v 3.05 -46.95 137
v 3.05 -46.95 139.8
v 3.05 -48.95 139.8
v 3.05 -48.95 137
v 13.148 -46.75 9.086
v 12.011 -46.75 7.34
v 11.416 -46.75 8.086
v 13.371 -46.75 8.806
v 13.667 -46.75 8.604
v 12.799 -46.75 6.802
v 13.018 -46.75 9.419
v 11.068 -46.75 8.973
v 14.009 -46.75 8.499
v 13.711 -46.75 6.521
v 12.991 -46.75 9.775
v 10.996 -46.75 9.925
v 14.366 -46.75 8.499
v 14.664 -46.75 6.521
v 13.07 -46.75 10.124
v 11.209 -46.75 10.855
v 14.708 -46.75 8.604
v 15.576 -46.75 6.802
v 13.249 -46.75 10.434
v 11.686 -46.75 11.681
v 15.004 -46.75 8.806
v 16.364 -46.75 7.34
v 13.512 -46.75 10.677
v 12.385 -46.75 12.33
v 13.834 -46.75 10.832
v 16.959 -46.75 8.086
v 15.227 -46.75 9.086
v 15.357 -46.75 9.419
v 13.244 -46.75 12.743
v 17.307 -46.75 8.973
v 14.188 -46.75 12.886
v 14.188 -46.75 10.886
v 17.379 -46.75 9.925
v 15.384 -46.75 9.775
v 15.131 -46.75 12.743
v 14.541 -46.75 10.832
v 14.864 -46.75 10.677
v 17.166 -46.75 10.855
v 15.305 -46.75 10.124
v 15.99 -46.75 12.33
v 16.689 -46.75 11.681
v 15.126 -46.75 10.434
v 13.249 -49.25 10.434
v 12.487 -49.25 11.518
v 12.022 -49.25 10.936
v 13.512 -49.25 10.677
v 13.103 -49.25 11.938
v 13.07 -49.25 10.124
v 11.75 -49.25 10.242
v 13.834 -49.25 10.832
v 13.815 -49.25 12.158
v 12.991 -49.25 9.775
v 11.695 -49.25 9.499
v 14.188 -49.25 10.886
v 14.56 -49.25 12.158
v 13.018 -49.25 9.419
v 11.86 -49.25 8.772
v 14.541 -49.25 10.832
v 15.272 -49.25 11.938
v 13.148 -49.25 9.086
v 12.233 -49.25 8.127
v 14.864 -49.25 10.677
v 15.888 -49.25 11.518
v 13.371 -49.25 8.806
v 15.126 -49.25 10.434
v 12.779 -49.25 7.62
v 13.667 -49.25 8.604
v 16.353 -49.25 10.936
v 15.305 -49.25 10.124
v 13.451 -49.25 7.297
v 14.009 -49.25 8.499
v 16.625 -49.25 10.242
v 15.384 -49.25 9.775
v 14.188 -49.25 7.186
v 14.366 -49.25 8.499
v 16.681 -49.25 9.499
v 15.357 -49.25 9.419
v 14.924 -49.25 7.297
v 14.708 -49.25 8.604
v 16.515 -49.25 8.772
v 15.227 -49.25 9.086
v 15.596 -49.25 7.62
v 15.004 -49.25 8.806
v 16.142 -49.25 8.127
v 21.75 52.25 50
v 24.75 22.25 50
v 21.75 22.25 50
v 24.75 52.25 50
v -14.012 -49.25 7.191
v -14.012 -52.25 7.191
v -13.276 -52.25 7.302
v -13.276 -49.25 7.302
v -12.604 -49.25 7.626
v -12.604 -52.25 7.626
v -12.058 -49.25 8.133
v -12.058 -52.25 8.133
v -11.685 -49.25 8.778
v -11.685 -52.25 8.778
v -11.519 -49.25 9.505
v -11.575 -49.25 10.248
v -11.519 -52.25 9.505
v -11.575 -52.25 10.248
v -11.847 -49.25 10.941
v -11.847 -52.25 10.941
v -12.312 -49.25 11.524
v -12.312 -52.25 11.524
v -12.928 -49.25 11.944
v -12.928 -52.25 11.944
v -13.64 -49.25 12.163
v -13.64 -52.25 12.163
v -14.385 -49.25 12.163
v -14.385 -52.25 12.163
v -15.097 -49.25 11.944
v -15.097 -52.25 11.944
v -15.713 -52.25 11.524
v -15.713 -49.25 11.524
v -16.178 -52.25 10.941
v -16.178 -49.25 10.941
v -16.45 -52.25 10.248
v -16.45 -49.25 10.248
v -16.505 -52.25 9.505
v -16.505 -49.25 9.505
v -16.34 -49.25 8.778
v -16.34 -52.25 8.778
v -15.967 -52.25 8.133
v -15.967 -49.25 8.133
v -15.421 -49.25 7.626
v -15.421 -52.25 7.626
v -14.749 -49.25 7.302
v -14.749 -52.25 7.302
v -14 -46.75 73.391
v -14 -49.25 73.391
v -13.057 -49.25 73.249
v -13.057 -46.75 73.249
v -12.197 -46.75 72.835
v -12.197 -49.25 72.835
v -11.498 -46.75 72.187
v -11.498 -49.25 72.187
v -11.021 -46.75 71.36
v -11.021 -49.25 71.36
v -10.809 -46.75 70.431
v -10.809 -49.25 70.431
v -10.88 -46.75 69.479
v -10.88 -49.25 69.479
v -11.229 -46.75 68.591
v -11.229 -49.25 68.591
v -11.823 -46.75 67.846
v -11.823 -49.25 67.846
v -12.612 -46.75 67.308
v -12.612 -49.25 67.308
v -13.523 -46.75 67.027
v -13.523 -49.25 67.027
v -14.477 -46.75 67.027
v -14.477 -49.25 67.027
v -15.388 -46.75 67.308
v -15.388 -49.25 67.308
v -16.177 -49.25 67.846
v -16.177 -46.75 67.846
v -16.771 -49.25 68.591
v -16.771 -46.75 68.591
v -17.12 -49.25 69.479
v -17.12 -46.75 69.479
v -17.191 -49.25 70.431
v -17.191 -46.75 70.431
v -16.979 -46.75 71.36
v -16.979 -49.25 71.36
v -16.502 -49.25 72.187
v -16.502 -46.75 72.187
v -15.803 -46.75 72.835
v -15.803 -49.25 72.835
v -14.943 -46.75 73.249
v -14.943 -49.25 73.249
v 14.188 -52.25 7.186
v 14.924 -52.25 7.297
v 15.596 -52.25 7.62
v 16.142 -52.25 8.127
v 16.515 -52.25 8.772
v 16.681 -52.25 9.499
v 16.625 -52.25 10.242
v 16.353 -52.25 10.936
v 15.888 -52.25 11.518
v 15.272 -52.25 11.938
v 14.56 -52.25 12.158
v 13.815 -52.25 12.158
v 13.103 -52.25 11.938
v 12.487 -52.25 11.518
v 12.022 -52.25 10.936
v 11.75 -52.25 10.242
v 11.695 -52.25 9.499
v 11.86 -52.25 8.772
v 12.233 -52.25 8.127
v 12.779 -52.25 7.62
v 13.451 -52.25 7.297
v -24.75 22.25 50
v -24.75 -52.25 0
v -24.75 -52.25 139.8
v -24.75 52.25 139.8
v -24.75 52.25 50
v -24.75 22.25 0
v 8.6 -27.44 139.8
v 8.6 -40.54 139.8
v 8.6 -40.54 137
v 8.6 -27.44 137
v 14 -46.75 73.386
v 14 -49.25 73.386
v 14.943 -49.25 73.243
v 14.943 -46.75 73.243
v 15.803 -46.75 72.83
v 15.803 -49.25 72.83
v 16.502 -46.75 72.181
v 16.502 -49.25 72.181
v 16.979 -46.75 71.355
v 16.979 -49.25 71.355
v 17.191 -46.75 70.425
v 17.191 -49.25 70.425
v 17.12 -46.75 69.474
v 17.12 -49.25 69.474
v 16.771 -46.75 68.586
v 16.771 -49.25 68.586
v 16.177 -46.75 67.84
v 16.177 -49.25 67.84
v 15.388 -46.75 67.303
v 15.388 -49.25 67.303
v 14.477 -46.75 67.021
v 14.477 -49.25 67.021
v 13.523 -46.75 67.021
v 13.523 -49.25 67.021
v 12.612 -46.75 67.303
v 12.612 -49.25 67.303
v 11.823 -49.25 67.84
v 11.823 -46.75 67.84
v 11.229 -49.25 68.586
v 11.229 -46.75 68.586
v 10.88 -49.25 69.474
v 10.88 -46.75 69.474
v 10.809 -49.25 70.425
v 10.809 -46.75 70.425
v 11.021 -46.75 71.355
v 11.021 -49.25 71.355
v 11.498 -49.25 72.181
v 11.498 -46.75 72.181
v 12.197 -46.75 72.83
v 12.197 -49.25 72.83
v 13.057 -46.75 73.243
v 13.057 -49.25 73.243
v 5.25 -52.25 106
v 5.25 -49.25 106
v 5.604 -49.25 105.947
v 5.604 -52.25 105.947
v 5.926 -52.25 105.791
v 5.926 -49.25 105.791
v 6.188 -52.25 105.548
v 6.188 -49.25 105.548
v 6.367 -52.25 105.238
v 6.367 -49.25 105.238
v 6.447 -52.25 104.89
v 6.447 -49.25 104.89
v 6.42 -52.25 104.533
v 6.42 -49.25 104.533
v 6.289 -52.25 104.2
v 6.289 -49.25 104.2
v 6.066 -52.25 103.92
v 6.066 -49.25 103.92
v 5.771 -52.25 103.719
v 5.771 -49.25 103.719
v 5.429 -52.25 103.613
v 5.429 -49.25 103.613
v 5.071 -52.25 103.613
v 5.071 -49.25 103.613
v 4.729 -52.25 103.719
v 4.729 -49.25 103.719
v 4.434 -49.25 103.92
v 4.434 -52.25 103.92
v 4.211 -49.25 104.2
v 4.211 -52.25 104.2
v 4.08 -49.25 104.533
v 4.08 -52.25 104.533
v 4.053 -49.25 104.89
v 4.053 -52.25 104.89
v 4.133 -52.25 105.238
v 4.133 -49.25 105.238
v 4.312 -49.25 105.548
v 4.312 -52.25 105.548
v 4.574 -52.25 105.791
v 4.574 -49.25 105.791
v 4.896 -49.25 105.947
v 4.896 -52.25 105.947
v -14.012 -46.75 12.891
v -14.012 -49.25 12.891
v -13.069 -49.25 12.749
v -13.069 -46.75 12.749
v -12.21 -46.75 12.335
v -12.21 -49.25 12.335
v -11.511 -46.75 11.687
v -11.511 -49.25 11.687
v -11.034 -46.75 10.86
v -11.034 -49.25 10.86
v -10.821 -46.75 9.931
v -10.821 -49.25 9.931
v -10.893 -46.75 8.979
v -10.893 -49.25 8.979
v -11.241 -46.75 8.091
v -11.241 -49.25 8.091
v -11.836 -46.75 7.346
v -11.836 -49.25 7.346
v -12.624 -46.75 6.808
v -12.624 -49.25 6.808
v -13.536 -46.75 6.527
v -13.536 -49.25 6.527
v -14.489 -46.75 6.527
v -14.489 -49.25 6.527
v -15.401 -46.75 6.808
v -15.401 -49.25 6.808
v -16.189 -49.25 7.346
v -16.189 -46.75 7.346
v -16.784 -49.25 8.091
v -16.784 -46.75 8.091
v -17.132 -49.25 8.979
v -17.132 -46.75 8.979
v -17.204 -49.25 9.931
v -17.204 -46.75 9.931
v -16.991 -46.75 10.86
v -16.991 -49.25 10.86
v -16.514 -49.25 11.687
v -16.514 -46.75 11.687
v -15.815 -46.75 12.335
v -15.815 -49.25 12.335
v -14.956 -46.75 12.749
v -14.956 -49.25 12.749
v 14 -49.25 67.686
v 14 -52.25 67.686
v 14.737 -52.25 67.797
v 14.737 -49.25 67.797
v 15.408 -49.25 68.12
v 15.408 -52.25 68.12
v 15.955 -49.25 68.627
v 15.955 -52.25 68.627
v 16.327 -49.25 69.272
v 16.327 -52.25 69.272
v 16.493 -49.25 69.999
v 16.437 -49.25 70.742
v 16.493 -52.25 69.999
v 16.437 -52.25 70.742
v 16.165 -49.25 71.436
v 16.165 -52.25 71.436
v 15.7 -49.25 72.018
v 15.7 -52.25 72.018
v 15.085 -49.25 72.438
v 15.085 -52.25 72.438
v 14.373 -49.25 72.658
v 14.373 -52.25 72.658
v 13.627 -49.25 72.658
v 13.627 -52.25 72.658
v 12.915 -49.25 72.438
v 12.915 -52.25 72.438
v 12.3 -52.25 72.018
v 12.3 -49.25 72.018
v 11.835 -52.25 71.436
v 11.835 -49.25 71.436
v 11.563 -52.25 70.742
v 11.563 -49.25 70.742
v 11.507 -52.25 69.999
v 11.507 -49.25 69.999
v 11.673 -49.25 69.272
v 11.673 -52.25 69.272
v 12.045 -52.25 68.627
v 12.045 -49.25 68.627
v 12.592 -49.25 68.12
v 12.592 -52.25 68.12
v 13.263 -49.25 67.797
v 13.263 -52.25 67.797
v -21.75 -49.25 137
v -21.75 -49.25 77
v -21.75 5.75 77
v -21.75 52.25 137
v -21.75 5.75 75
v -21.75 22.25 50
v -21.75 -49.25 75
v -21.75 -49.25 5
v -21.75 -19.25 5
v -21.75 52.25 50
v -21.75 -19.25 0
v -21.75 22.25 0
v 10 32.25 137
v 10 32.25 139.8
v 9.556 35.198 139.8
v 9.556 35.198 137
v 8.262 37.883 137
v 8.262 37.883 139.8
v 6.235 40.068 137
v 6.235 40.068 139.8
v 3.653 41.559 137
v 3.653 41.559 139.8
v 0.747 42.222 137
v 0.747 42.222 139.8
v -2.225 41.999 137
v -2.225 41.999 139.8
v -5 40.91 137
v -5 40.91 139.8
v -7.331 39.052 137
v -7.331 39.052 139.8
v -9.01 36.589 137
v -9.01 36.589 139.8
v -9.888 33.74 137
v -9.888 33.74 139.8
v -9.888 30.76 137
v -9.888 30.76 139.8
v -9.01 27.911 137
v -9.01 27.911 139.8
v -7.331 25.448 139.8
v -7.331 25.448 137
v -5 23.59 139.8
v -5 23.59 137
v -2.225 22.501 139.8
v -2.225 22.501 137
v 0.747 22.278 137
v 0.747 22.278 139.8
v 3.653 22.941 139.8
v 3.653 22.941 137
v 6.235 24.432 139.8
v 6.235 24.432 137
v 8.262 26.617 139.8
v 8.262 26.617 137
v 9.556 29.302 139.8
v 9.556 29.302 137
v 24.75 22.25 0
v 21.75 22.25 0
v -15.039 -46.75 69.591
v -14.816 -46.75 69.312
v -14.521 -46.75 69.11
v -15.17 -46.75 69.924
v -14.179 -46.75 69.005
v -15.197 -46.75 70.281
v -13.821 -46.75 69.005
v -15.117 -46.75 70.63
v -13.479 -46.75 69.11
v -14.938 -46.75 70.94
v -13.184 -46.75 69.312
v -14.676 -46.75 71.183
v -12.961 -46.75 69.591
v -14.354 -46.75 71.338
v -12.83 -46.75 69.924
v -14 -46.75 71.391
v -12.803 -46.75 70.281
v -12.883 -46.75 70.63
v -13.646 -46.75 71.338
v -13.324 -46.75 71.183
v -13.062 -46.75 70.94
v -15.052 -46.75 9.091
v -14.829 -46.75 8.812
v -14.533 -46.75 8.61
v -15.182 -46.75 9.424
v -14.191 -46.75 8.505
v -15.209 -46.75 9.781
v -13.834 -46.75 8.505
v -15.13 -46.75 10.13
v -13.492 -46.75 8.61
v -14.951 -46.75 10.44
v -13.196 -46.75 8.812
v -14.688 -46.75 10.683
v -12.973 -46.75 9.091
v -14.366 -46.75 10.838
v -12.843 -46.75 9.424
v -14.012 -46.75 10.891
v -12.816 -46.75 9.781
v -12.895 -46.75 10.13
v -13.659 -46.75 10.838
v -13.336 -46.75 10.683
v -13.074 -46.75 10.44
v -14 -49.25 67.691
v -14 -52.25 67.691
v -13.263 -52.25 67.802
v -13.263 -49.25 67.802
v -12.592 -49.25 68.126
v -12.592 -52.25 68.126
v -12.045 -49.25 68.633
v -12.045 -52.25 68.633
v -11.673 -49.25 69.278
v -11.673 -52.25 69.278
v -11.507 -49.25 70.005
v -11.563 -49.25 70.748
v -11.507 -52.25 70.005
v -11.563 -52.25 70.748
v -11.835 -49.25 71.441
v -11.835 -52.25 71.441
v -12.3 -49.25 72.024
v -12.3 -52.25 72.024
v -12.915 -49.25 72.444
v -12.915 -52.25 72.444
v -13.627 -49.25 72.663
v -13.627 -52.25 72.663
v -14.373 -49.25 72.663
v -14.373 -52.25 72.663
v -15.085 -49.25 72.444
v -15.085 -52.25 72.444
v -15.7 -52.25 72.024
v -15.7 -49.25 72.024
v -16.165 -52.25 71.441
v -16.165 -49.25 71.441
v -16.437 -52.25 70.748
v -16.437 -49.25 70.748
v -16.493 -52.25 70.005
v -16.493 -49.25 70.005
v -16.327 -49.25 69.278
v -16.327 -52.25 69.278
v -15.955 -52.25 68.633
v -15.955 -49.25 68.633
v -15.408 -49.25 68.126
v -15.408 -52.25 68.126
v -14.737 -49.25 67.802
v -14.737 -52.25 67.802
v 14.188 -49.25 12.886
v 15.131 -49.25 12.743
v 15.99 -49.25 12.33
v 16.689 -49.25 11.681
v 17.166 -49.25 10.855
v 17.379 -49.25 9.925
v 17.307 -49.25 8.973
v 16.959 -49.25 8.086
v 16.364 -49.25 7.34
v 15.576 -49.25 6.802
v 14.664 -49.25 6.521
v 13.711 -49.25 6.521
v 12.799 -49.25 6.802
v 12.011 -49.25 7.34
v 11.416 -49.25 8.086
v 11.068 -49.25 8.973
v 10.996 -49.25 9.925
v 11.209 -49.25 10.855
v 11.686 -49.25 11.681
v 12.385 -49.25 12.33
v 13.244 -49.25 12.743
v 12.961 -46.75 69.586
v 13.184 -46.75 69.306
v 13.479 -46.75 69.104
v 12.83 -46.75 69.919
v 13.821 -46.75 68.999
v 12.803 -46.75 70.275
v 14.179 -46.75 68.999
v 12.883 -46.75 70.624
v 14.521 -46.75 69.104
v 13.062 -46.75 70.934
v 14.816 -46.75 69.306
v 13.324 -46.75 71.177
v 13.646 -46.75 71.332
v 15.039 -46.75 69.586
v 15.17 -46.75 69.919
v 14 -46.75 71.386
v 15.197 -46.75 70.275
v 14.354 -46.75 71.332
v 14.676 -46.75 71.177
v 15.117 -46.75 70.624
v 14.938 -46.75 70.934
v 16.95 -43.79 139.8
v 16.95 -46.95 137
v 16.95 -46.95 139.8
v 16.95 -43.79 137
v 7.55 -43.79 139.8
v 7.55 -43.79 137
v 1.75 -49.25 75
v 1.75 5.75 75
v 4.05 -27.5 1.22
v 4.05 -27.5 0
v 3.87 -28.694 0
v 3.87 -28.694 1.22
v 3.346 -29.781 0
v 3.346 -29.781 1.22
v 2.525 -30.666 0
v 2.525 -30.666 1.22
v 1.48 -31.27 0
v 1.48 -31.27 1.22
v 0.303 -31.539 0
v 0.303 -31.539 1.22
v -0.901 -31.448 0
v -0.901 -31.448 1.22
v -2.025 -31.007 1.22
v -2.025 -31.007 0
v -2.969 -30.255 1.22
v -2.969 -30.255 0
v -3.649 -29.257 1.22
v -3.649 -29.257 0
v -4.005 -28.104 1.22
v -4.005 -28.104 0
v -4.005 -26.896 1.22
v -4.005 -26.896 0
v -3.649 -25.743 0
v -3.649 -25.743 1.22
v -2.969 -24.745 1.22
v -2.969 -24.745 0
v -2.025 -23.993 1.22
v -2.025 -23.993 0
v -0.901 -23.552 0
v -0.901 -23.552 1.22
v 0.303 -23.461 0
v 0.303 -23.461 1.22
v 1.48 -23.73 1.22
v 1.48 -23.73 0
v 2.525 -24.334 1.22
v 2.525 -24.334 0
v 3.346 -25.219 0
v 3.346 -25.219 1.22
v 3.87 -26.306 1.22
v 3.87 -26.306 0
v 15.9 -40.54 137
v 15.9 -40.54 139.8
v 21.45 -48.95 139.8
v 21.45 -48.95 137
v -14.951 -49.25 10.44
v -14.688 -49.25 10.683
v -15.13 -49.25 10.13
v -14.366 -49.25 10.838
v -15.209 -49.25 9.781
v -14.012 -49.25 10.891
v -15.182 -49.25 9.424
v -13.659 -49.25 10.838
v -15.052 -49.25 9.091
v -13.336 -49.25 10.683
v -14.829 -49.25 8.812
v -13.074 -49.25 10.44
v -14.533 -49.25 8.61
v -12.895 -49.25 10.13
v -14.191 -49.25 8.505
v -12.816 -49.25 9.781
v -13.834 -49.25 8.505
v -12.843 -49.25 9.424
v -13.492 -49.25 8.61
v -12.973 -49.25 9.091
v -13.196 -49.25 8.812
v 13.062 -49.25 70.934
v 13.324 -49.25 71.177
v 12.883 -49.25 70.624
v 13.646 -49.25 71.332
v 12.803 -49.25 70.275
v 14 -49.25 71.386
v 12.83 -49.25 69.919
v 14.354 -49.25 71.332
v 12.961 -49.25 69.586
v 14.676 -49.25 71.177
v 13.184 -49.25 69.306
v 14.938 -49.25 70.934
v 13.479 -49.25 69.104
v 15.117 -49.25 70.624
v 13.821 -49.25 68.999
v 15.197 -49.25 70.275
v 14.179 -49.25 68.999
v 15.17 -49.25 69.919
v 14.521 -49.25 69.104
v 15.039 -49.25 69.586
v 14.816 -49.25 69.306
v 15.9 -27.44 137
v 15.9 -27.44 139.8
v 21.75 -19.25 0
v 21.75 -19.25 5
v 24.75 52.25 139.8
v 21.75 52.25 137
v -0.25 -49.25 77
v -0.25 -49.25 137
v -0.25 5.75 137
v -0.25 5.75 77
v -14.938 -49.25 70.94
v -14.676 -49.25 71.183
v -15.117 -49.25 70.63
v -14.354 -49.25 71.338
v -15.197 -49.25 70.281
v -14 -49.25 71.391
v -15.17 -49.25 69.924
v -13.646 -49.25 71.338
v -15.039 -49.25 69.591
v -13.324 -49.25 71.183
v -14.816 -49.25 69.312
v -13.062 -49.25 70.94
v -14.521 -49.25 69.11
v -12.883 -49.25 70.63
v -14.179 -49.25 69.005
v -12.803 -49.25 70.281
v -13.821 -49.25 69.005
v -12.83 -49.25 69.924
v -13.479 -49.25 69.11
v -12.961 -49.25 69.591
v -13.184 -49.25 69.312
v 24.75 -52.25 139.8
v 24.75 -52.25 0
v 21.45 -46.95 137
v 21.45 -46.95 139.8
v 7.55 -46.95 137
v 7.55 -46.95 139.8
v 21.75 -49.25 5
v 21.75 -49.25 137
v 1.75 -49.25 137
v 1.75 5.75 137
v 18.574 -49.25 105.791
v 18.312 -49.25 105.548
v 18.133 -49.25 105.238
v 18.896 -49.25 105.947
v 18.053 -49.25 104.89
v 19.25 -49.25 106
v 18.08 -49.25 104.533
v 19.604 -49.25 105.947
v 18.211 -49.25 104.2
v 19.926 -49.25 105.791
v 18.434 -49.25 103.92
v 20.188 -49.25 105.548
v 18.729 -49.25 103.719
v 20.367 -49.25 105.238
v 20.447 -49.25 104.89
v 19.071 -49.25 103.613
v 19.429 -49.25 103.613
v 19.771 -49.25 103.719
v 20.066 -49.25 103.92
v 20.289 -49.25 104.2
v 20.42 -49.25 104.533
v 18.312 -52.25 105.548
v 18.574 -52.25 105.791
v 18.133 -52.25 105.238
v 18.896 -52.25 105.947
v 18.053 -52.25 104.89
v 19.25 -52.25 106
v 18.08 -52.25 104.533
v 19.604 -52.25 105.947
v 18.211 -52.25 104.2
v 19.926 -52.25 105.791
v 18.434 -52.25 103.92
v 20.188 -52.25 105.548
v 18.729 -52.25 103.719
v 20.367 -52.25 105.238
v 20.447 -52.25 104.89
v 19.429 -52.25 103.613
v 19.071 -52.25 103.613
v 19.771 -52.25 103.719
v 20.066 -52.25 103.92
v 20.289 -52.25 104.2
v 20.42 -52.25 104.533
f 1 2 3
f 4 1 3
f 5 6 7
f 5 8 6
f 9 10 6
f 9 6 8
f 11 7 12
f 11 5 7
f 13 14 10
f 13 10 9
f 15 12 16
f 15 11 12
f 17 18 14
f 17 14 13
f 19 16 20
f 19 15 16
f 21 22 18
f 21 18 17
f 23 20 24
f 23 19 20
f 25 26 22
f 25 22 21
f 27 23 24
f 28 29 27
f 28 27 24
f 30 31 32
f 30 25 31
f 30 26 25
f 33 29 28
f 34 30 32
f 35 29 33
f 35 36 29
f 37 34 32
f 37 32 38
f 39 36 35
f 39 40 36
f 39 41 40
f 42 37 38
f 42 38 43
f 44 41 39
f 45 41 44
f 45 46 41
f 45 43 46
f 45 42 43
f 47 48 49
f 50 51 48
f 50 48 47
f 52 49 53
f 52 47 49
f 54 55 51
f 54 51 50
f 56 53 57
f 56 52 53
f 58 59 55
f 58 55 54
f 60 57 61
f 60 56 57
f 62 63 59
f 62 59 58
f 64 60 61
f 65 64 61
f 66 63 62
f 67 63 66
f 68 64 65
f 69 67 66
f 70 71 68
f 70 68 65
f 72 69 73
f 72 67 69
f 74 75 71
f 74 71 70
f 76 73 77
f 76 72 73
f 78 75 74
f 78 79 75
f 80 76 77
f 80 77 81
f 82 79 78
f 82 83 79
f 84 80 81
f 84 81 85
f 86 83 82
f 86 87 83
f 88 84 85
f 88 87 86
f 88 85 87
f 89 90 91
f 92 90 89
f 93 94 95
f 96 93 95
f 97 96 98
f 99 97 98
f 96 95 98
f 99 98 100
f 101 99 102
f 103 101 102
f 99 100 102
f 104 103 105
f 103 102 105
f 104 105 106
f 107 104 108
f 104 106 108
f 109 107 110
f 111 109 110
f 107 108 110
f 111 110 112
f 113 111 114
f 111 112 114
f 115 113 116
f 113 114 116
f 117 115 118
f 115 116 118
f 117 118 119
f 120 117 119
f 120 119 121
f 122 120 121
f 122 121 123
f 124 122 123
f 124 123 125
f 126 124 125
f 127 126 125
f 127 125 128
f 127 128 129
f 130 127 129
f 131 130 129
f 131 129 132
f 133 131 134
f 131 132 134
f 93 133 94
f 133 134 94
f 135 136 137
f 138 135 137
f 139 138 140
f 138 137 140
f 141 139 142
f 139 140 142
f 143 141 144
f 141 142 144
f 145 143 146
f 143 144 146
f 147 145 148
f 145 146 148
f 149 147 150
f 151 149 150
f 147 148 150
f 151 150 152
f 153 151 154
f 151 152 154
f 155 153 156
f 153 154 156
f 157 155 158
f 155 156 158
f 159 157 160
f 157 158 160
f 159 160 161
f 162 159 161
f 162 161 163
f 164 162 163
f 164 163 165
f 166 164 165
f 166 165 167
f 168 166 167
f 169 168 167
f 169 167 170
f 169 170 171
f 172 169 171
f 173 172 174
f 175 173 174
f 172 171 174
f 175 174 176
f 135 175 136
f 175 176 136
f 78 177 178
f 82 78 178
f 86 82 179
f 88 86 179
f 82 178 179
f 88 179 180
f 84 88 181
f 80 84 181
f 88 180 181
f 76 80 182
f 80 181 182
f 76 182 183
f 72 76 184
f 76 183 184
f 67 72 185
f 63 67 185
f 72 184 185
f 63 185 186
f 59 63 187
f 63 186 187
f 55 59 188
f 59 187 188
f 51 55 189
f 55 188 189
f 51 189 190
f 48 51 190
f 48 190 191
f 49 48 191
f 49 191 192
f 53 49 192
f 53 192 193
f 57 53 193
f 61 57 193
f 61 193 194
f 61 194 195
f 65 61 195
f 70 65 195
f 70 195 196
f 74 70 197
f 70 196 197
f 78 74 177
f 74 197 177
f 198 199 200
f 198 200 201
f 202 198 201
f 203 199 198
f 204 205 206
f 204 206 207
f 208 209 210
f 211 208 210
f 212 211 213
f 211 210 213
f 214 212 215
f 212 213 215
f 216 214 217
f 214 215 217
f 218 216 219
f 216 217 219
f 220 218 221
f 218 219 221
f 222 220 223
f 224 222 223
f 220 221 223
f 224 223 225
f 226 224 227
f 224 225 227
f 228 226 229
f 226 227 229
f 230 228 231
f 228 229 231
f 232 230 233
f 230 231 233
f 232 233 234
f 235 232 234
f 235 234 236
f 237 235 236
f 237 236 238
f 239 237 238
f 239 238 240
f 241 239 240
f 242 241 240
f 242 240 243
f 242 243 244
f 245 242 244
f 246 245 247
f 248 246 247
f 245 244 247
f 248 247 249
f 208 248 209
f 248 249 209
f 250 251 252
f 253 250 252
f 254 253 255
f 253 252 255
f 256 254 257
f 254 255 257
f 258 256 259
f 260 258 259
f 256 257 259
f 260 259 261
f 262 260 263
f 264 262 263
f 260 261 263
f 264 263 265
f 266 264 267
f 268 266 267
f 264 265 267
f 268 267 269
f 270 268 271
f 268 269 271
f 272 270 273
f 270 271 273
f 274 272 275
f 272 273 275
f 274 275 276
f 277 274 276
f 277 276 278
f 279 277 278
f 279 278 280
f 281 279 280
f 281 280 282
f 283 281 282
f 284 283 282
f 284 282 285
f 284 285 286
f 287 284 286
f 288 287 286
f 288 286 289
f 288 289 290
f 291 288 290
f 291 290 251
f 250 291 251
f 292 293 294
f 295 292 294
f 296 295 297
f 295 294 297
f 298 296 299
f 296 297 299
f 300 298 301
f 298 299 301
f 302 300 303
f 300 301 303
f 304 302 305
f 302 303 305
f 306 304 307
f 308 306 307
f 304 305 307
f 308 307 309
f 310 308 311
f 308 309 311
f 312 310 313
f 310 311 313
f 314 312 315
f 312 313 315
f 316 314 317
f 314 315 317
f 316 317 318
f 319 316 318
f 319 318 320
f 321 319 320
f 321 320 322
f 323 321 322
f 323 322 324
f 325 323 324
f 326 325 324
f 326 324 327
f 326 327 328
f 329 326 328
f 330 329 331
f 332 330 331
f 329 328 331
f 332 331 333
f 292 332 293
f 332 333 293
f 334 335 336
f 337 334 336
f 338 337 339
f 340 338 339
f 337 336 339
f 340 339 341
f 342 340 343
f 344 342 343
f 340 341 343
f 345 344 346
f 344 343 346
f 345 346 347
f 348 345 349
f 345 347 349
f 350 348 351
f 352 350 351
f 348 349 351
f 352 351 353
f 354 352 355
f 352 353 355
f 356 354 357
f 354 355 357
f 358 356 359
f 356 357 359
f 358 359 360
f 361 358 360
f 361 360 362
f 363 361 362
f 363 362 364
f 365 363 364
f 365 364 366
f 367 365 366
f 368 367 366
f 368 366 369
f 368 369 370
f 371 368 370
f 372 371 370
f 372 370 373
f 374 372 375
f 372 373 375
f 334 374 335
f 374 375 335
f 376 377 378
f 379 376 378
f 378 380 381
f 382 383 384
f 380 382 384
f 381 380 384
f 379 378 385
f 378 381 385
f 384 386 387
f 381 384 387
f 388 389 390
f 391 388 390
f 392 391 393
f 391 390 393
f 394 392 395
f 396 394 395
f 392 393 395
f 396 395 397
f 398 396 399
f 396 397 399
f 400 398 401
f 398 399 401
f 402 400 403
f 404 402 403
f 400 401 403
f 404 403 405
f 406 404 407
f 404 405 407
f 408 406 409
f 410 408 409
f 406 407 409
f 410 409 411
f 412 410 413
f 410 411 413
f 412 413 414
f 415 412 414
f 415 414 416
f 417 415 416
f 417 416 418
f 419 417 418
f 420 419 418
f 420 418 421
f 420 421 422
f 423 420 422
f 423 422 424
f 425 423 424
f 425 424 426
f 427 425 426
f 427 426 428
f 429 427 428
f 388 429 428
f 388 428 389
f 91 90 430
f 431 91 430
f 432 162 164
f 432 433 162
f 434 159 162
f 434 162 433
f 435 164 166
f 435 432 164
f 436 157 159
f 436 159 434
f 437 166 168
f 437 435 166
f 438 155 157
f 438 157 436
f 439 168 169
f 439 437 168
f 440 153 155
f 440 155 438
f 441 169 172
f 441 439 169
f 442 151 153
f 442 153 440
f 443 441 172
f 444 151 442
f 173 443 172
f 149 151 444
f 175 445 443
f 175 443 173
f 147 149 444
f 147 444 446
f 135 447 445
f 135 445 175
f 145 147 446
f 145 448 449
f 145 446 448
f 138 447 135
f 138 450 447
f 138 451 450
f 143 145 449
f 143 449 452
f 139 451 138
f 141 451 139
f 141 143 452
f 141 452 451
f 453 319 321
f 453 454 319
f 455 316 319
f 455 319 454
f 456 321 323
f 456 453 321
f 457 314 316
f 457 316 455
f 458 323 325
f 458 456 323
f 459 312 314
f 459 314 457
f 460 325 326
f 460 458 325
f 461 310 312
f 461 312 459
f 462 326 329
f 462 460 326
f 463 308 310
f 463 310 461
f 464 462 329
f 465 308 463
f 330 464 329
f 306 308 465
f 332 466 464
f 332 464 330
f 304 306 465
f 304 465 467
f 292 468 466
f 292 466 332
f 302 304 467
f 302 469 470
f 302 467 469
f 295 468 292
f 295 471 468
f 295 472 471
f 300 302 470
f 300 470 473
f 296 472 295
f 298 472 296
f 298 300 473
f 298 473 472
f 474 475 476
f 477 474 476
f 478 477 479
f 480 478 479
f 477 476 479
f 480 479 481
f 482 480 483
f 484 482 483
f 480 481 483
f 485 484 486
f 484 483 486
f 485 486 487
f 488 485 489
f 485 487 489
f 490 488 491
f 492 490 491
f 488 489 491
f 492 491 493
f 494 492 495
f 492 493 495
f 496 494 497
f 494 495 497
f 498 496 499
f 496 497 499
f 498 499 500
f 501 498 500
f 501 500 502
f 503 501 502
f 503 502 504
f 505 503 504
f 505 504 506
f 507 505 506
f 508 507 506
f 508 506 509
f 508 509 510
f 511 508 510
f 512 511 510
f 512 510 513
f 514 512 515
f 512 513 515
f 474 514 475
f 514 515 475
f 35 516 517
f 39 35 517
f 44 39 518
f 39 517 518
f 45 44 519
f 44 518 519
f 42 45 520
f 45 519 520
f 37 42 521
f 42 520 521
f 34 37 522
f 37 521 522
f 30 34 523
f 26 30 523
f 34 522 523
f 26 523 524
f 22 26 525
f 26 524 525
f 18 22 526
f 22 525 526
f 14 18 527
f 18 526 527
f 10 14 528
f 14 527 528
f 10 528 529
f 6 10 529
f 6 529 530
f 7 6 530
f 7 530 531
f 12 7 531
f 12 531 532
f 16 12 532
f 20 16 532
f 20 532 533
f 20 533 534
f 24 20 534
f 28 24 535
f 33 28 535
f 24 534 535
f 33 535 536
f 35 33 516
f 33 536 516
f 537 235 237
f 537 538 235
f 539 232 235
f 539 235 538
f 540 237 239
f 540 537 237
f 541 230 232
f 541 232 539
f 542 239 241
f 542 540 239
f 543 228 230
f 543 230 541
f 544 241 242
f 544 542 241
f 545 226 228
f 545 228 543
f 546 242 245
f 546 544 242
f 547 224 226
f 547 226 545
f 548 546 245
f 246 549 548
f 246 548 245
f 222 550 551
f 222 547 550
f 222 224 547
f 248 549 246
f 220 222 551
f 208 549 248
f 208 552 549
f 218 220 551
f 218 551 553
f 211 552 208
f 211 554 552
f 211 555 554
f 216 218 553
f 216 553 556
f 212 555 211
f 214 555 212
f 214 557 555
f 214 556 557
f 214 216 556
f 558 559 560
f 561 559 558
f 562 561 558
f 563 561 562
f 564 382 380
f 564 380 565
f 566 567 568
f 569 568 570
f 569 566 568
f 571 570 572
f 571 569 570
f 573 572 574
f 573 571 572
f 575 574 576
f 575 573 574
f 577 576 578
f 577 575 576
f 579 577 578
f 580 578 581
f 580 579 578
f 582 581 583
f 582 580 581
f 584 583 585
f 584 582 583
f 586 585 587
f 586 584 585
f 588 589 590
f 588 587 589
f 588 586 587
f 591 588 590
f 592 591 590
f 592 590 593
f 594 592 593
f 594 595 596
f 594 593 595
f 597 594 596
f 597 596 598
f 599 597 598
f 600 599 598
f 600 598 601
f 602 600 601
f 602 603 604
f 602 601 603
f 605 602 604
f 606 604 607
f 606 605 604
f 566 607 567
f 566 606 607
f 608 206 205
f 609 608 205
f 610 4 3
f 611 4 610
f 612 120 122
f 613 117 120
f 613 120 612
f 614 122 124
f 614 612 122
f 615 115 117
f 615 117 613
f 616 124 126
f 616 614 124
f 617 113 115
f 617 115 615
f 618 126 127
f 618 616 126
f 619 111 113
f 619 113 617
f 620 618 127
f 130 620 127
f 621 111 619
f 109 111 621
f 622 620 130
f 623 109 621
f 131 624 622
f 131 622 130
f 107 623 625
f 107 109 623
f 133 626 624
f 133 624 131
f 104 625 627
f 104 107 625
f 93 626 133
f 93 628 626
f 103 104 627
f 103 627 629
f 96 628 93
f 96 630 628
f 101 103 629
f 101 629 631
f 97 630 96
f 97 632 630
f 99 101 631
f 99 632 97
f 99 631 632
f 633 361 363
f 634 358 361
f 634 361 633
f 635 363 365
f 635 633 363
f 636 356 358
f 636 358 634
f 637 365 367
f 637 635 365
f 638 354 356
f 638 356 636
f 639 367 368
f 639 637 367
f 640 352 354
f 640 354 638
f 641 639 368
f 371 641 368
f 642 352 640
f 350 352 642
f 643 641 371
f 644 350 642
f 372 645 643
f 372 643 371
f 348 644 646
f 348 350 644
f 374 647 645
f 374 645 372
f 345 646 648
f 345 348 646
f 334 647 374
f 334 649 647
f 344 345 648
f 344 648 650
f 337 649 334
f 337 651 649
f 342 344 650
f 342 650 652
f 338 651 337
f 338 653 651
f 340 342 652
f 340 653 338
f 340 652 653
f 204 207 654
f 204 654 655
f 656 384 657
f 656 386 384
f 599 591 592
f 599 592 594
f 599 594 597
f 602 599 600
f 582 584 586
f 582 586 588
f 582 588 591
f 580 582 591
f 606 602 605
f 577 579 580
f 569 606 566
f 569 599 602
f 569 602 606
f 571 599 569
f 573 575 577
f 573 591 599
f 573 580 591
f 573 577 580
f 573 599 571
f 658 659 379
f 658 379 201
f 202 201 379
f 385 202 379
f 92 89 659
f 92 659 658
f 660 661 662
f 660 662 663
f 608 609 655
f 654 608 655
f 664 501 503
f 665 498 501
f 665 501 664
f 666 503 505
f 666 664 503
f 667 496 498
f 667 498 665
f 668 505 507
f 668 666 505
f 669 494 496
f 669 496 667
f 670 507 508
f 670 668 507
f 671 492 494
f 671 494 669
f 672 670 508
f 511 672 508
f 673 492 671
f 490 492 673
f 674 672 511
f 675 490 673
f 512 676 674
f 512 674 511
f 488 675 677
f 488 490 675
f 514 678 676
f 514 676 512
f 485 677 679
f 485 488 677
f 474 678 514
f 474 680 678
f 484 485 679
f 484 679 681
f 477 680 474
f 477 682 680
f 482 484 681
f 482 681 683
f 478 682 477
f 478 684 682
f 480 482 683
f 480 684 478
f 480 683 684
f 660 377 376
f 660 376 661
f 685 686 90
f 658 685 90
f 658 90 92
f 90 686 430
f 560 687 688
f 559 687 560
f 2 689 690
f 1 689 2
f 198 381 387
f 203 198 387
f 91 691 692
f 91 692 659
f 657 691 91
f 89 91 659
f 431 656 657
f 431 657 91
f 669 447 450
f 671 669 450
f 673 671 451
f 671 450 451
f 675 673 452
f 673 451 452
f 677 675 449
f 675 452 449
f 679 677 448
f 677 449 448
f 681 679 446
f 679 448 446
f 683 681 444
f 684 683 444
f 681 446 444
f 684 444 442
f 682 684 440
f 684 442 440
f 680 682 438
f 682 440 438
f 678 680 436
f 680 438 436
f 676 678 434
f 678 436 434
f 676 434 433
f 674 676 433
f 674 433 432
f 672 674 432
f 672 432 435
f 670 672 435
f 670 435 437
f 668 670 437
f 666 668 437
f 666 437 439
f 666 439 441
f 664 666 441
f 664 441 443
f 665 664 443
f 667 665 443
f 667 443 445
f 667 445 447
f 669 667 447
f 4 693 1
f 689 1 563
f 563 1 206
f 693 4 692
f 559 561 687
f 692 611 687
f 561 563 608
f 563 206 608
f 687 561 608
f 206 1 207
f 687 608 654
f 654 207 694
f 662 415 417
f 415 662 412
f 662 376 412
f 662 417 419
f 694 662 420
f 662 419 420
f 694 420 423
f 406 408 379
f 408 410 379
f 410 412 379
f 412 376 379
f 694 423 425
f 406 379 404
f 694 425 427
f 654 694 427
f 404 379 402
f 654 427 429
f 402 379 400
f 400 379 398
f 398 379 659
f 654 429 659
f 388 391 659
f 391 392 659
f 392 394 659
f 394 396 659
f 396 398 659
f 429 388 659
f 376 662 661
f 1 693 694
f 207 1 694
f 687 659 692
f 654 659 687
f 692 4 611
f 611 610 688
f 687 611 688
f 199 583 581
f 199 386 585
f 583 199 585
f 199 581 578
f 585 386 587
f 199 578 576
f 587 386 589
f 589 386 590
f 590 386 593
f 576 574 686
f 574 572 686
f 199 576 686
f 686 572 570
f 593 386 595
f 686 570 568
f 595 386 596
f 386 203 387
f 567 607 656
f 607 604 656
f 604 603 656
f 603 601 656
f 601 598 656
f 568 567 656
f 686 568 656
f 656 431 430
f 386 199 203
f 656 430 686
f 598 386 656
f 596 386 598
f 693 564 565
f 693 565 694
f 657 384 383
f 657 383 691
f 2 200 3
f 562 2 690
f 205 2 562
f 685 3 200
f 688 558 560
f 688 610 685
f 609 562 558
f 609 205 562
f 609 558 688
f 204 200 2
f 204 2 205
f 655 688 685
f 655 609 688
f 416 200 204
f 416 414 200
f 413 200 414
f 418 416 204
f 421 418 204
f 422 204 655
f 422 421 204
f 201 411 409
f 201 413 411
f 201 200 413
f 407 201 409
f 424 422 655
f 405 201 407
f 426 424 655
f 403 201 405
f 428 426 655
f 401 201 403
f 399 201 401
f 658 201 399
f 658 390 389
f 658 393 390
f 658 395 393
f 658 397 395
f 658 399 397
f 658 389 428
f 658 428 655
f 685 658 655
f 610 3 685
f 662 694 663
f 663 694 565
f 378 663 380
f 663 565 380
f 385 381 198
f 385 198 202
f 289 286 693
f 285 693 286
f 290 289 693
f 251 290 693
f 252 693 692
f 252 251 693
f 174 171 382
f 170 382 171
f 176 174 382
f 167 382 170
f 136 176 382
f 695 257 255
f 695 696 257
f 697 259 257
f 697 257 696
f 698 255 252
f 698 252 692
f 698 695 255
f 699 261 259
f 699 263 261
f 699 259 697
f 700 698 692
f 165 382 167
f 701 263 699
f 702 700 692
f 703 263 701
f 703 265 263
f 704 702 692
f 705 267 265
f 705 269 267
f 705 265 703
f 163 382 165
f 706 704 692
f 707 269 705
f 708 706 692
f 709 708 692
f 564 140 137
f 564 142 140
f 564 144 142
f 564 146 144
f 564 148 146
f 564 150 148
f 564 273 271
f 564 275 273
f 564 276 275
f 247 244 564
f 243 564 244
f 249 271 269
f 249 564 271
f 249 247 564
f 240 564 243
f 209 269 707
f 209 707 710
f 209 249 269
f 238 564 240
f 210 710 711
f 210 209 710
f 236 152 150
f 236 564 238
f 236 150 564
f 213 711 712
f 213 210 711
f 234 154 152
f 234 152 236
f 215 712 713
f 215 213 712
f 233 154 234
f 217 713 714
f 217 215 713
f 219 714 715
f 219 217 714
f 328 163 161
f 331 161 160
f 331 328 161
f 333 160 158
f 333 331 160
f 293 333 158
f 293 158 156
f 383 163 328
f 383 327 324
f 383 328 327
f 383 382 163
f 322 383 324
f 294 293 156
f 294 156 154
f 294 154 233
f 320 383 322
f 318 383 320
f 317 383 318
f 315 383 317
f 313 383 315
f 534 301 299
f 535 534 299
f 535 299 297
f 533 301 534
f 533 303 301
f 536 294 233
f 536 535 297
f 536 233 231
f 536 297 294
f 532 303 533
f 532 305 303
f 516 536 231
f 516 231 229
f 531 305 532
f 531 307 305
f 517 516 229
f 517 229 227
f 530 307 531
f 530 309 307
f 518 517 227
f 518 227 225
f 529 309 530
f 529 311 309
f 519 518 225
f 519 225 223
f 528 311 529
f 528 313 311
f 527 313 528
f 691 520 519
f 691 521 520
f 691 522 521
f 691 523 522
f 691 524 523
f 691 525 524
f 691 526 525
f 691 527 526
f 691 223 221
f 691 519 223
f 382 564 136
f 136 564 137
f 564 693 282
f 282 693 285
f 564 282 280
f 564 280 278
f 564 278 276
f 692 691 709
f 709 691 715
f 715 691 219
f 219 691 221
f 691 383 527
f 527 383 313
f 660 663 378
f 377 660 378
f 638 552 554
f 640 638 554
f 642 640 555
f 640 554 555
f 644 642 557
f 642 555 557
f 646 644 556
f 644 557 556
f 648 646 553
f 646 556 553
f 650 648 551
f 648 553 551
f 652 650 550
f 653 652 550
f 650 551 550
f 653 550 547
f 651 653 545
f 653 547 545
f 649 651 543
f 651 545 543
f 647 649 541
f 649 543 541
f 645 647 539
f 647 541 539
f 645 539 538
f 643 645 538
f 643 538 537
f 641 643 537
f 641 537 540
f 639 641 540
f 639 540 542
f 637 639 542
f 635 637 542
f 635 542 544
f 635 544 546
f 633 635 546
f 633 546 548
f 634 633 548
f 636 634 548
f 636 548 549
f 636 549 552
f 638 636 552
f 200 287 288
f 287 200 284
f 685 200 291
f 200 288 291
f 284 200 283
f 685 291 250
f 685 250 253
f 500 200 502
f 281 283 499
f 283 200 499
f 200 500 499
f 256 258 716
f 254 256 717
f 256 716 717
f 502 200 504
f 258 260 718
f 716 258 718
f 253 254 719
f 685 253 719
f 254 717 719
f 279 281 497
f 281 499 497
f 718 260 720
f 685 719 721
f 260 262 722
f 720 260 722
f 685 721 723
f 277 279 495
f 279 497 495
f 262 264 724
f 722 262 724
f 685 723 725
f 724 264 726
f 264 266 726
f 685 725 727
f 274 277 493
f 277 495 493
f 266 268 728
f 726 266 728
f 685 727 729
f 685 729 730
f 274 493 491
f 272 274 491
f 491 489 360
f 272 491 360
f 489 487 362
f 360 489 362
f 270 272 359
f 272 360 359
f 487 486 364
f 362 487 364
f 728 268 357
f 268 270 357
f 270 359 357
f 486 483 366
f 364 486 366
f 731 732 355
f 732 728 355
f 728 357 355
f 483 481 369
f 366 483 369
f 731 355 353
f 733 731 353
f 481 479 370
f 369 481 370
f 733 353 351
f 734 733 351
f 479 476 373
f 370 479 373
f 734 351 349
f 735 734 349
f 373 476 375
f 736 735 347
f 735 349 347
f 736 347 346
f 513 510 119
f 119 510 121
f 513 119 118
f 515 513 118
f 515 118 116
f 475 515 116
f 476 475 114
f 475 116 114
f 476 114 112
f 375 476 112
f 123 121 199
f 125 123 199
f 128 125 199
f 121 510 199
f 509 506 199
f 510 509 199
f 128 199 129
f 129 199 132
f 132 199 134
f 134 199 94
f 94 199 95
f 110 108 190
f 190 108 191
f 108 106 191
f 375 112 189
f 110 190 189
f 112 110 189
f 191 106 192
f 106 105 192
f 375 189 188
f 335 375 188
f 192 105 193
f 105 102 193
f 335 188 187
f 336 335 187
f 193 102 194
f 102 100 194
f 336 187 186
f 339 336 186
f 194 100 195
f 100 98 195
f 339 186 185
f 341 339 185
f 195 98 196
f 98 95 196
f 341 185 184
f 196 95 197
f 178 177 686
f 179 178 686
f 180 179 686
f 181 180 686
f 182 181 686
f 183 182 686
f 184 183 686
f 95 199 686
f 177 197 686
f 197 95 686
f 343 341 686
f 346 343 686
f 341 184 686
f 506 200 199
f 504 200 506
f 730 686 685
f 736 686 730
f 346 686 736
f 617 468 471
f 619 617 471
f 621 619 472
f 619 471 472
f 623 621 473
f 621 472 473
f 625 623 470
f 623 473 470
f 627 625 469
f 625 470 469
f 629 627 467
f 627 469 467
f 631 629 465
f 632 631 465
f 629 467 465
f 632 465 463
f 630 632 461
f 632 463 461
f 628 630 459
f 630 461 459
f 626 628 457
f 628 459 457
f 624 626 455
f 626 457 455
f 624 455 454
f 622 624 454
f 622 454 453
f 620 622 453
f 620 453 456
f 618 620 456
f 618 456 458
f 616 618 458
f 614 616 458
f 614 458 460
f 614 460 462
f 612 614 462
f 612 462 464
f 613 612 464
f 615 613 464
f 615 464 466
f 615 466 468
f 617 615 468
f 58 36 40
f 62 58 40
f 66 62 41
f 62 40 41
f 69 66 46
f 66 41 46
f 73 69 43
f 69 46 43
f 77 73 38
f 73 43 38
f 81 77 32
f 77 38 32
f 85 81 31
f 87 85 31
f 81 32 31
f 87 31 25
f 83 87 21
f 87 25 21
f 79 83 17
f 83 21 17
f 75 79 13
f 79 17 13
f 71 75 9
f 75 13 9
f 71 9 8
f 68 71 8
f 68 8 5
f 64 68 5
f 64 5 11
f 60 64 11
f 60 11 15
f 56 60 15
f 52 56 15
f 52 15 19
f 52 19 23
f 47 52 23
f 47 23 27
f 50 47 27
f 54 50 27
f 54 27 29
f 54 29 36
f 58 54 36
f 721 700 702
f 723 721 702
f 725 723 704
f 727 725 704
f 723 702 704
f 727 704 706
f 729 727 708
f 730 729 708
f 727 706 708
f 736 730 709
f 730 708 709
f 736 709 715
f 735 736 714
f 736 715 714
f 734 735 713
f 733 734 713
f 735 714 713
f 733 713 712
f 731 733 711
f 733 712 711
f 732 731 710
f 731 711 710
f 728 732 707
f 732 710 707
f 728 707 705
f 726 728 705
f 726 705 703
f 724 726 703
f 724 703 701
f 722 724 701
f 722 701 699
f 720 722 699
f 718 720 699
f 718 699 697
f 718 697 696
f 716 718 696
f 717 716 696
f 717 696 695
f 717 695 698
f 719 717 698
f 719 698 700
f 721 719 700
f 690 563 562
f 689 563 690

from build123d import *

# Parameters (mm, degrees)
ESQUISSE1_W                   = 49.5
ESQUISSE1_H                   = 104.5
BOSS_EXTRU_1_DEPTH            = 139.8
COQUE1_T                      = -3
ENL_V_MAT_EXTRU_1_REACH       = 159.24
ESQUISSE2_W                   = 50
ESQUISSE2_H                   = 30
ESQUISSE3_W                   = 43.5
ESQUISSE3_H                   = 30
BOSS_EXTRU_2_DEPTH            = 2
ENL_V_MAT_EXTRU_2_REACH       = 153.283
ESQUISSE5_R                   = 10
ENL_V_MAT_EXTRU_3_REACH       = 150.516
ESQUISSE6_W                   = 43.5
ESQUISSE6_H                   = 41.5
ENL_V_MAT_EXTRU_4_REACH       = 153.283
ESQUISSE7_W                   = 6.9
ESQUISSE7_H                   = 12.7
D_PLACER_START                = 136.8
D_PLACER_LA_FACE1_OUTLINE_W   = 43.5
D_PLACER_LA_FACE1_OUTLINE_H   = 101.5
D_PLACER_LA_FACE1_OUTLINE_W_2 = 6.9
D_PLACER_LA_FACE1_OUTLINE_H_2 = 12.7
D_PLACER_LA_FACE1_OUTLINE_R   = 10
D_PLACER_LA_FACE1_DEPTH       = 0.2
D_PLACER_START_2              = 137
D_PLACER_LA_FACE1_2_DEPTH     = 2.8
ENL_V_MAT_EXTRU_5_REACH       = 176.525
ESQUISSE8_R                   = 1.2
D_PLACER_START_3              = 8.6
D_PLACER_LA_FACE2_OUTLINE_W   = 13.1
D_PLACER_LA_FACE2_OUTLINE_H   = 2.8
D_PLACER_LA_FACE2_DEPTH       = 7.3
BOSS_EXTRU_3_DEPTH            = 55
ESQUISSE10_R                  = 3.2
BOSS_EXTRU_4_DEPTH            = 2.5
ENL_V_MAT_EXTRU_6_DEPTH       = 152.283393008
ENL_V_MAT_EXTRU_6_DEPTH_BACK  = 1.22
ESQUISSE12_R                  = 4.05
ENL_V_MAT_EXTRU_7_REACH       = 175.083
ESQUISSE13_R                  = 1.2
ESQUISSE14_R                  = 2.5
ENL_V_MAT_EXTRU_8_DEPTH       = 3


# Read off the part's stored shape, not the designer's step: Déplacer la face1, Déplacer la face2
with BuildPart() as part:
    # Esquisse1 → Boss.-Extru.1 (new body)
    with BuildSketch(Plane.XY):
        Rectangle(ESQUISSE1_W, ESQUISSE1_H)
    extrude(amount=BOSS_EXTRU_1_DEPTH)

    # Coque1
    coque1_openings = [part.faces().sort_by_distance(p)[0] for p in [
        (0, 52.25, 69.9),
    ]]
    offset(amount=COQUE1_T, openings=coque1_openings, kind=Kind.INTERSECTION)

    # Esquisse2 → Enlèv. mat.-Extru.1 (cut, up to next)
    with BuildSketch(Plane(origin=(24.75, 0, 0), x_dir=(0, 0, -1), z_dir=(1, 0, 0)), mode=Mode.PRIVATE) as enl_v_mat_extru_1_sk1:
        with Locations((-25, 37.25)):
            Rectangle(ESQUISSE2_W, ESQUISSE2_H)
    enl_v_mat_extru_1_tool1 = extrude(enl_v_mat_extru_1_sk1.sketch, amount=-ENL_V_MAT_EXTRU_1_REACH, mode=Mode.PRIVATE) & part.part
    add(enl_v_mat_extru_1_tool1.solids().sort_by_distance((24.75, 37.25, 25))[0], mode=Mode.SUBTRACT)

    # Esquisse3 → Boss.-Extru.2 (add)
    with BuildSketch(Plane.XY.offset(3)):
        with Locations((0, -34.25)):
            Rectangle(ESQUISSE3_W, ESQUISSE3_H)
    extrude(amount=BOSS_EXTRU_2_DEPTH)

    # Esquisse5 → Enlèv. mat.-Extru.2 (cut, up to next)
    with BuildSketch(Plane.XY.offset(139.8), mode=Mode.PRIVATE) as enl_v_mat_extru_2_sk1:
        with Locations((0, 32.25)):
            Circle(ESQUISSE5_R)
    enl_v_mat_extru_2_tool1 = extrude(enl_v_mat_extru_2_sk1.sketch, amount=-ENL_V_MAT_EXTRU_2_REACH, mode=Mode.PRIVATE) & part.part
    add(enl_v_mat_extru_2_tool1.solids().sort_by_distance((0, 32.25, 139.8))[0], mode=Mode.SUBTRACT)

    # Esquisse6 → Enlèv. mat.-Extru.3 (cut, up to next)
    with BuildSketch(Plane.XY.offset(3), mode=Mode.PRIVATE) as enl_v_mat_extru_3_sk1:
        with Locations((0, 1.5)):
            Rectangle(ESQUISSE6_W, ESQUISSE6_H)
    enl_v_mat_extru_3_tool1 = extrude(enl_v_mat_extru_3_sk1.sketch, amount=-ENL_V_MAT_EXTRU_3_REACH, mode=Mode.PRIVATE) & part.part
    add(enl_v_mat_extru_3_tool1.solids().sort_by_distance((0, 1.5, 3))[0], mode=Mode.SUBTRACT)

    # Esquisse7 → Enlèv. mat.-Extru.4 (cut, up to next)
    with BuildSketch(Plane.XY.offset(139.8), mode=Mode.PRIVATE) as enl_v_mat_extru_4_sk1:
        Polygon((16.75, -47.15), (21.25, -47.15), (21.25, -48.75), (3.25, -48.75), (3.25, -47.15), (7.75, -47.15), (7.75, -43.99), (16.75, -43.99), align=None)
    enl_v_mat_extru_4_tool1 = extrude(enl_v_mat_extru_4_sk1.sketch, amount=-ENL_V_MAT_EXTRU_4_REACH, mode=Mode.PRIVATE) & part.part
    # Esquisse7 → Enlèv. mat.-Extru.4 (cut, up to next)
    with BuildSketch(Plane.XY.offset(139.8), mode=Mode.PRIVATE) as enl_v_mat_extru_4_sk2:
        with Locations((12.25, -33.99)):
            Rectangle(ESQUISSE7_W, ESQUISSE7_H)
    enl_v_mat_extru_4_tool2 = extrude(enl_v_mat_extru_4_sk2.sketch, amount=-ENL_V_MAT_EXTRU_4_REACH, mode=Mode.PRIVATE) & part.part
    add(enl_v_mat_extru_4_tool1.solids().sort_by_distance((12.25, -46.767484, 139.8))[0], mode=Mode.SUBTRACT)
    add(enl_v_mat_extru_4_tool2.solids().sort_by_distance((12.25, -33.99, 139.8))[0], mode=Mode.SUBTRACT)

    # Déplacer la face1 outline → Déplacer la face1 (cut)
    with BuildSketch(Plane.XY.offset(D_PLACER_START)):
        with Locations((0, 1.5)):
            Rectangle(D_PLACER_LA_FACE1_OUTLINE_W, D_PLACER_LA_FACE1_OUTLINE_H)
        Polygon((16.75, -43.99), (16.75, -47.15), (21.25, -47.15), (21.25, -48.75), (3.25, -48.75), (3.25, -47.15), (7.75, -47.15), (7.75, -43.99), align=None, mode=Mode.SUBTRACT)
        with Locations((12.25, -33.99)):
            Rectangle(D_PLACER_LA_FACE1_OUTLINE_W_2, D_PLACER_LA_FACE1_OUTLINE_H_2, mode=Mode.SUBTRACT)
        with Locations((0, 32.25)):
            Circle(D_PLACER_LA_FACE1_OUTLINE_R, mode=Mode.SUBTRACT)
    extrude(amount=D_PLACER_LA_FACE1_DEPTH, mode=Mode.SUBTRACT)

    # D_placer la face1 2 outline → D_placer la face1 2 (cut)
    with BuildSketch(Plane.XY.offset(D_PLACER_START_2)):
        Polygon((21.45, -46.95), (16.95, -46.95), (16.95, -43.79), (7.55, -43.79), (7.55, -46.95), (3.05, -46.95), (3.05, -48.95), (21.45, -48.95), align=None)
        Polygon((16.75, -43.99), (16.75, -47.15), (21.25, -47.15), (21.25, -48.75), (3.25, -48.75), (3.25, -47.15), (7.75, -47.15), (7.75, -43.99), align=None, mode=Mode.SUBTRACT)
    extrude(amount=D_PLACER_LA_FACE1_2_DEPTH, mode=Mode.SUBTRACT)

    # Esquisse8 → Enlèv. mat.-Extru.5 (cut, up to next)
    with BuildSketch(Plane(origin=(0, -49.25, 0), x_dir=(1, 0, 0), z_dir=(0, 1, 0)), mode=Mode.PRIVATE) as enl_v_mat_extru_5_sk1:
        with Locations(Location((19.25, -104.8, 0), (0, 0, 270))):
            Circle(ESQUISSE8_R)
    enl_v_mat_extru_5_tool1 = extrude(enl_v_mat_extru_5_sk1.sketch, amount=-ENL_V_MAT_EXTRU_5_REACH, mode=Mode.PRIVATE) & part.part
    # Esquisse8 → Enlèv. mat.-Extru.5 (cut, up to next)
    with BuildSketch(Plane(origin=(0, -49.25, 0), x_dir=(1, 0, 0), z_dir=(0, 1, 0)), mode=Mode.PRIVATE) as enl_v_mat_extru_5_sk2:
        with Locations(Location((5.25, -104.8, 0), (0, 0, 270))):
            Circle(ESQUISSE8_R)
    enl_v_mat_extru_5_tool2 = extrude(enl_v_mat_extru_5_sk2.sketch, amount=-ENL_V_MAT_EXTRU_5_REACH, mode=Mode.PRIVATE) & part.part
    add(enl_v_mat_extru_5_tool1.solids().sort_by_distance((19.25, -49.25, 104.8))[0], mode=Mode.SUBTRACT)
    add(enl_v_mat_extru_5_tool2.solids().sort_by_distance((5.25, -49.25, 104.8))[0], mode=Mode.SUBTRACT)

    # Déplacer la face2 outline → Déplacer la face2 (cut)
    with BuildSketch(Plane.YZ.offset(D_PLACER_START_3)):
        with Locations((-33.99, 138.4)):
            Rectangle(D_PLACER_LA_FACE2_OUTLINE_W, D_PLACER_LA_FACE2_OUTLINE_H)
    extrude(amount=D_PLACER_LA_FACE2_DEPTH, mode=Mode.SUBTRACT)

    # Esquisse9 → Boss.-Extru.3 (add)
    with BuildSketch(Plane(origin=(0, -49.25, 0), x_dir=(1, 0, 0), z_dir=(0, 1, 0))):
        Polygon((-0.25, -137), (-0.25, -77), (-21.75, -77), (-21.75, -75), (1.75, -75), (1.75, -137), align=None)
    extrude(amount=BOSS_EXTRU_3_DEPTH)

    # Esquisse10 → Boss.-Extru.4 (add)
    with BuildSketch(Plane(origin=(0, -49.25, 0), x_dir=(1, 0, 0), z_dir=(0, 1, 0))):
        with Locations(Location((14.000000445, -70.185602769, 0), (0, 0, 270))):
            Circle(ESQUISSE10_R)
        with Locations(Location((-13.999998962, -70.191367017, 0), (0, 0, 270))):
            Circle(ESQUISSE10_R)
        with Locations(Location((14.187545547, -9.685562878, 0), (0, 0, 270))):
            Circle(ESQUISSE10_R)
        with Locations(Location((-14.012453855, -9.691368299, 0), (0, 0, 270))):
            Circle(ESQUISSE10_R)
    extrude(amount=BOSS_EXTRU_4_DEPTH)

    # Esquisse12 → Enlèv. mat.-Extru.6 (cut, two sides: drawn at the far end of the back side and taken through both)
    with BuildSketch(Plane(origin=(0, 0, 0), x_dir=(-1, 0, 0), z_dir=(0, 0, -1)).offset(-ENL_V_MAT_EXTRU_6_DEPTH_BACK)):
        with Locations(Location((0, -27.5, 0), (0, 0, 180))):
            Circle(ESQUISSE12_R)
    extrude(amount=ENL_V_MAT_EXTRU_6_DEPTH + ENL_V_MAT_EXTRU_6_DEPTH_BACK, mode=Mode.SUBTRACT)

    # Esquisse13 → Enlèv. mat.-Extru.7 (cut, up to next)
    with BuildSketch(Plane(origin=(0, -46.75, 0), x_dir=(1, 0, 0), z_dir=(0, 1, 0)), mode=Mode.PRIVATE) as enl_v_mat_extru_7_sk1:
        with Locations(Location((14.187545547, -9.685562878, 0), (0, 0, 270))):
            Circle(ESQUISSE13_R)
    enl_v_mat_extru_7_tool1 = extrude(enl_v_mat_extru_7_sk1.sketch, amount=-ENL_V_MAT_EXTRU_7_REACH, mode=Mode.PRIVATE) & part.part
    # Esquisse13 → Enlèv. mat.-Extru.7 (cut, up to next)
    with BuildSketch(Plane(origin=(0, -46.75, 0), x_dir=(1, 0, 0), z_dir=(0, 1, 0)), mode=Mode.PRIVATE) as enl_v_mat_extru_7_sk2:
        with Locations(Location((-14.012453855, -9.691368299, 0), (0, 0, 270))):
            Circle(ESQUISSE13_R)
    enl_v_mat_extru_7_tool2 = extrude(enl_v_mat_extru_7_sk2.sketch, amount=-ENL_V_MAT_EXTRU_7_REACH, mode=Mode.PRIVATE) & part.part
    # Esquisse13 → Enlèv. mat.-Extru.7 (cut, up to next)
    with BuildSketch(Plane(origin=(0, -46.75, 0), x_dir=(1, 0, 0), z_dir=(0, 1, 0)), mode=Mode.PRIVATE) as enl_v_mat_extru_7_sk3:
        with Locations(Location((-13.999998962, -70.191367017, 0), (0, 0, 270))):
            Circle(ESQUISSE13_R)
    enl_v_mat_extru_7_tool3 = extrude(enl_v_mat_extru_7_sk3.sketch, amount=-ENL_V_MAT_EXTRU_7_REACH, mode=Mode.PRIVATE) & part.part
    # Esquisse13 → Enlèv. mat.-Extru.7 (cut, up to next)
    with BuildSketch(Plane(origin=(0, -46.75, 0), x_dir=(1, 0, 0), z_dir=(0, 1, 0)), mode=Mode.PRIVATE) as enl_v_mat_extru_7_sk4:
        with Locations(Location((14.000000445, -70.185602769, 0), (0, 0, 270))):
            Circle(ESQUISSE13_R)
    enl_v_mat_extru_7_tool4 = extrude(enl_v_mat_extru_7_sk4.sketch, amount=-ENL_V_MAT_EXTRU_7_REACH, mode=Mode.PRIVATE) & part.part
    add(enl_v_mat_extru_7_tool1.solids().sort_by_distance((14.187546, -46.75, 9.685563))[0], mode=Mode.SUBTRACT)
    add(enl_v_mat_extru_7_tool2.solids().sort_by_distance((-14.012454, -46.75, 9.691368))[0], mode=Mode.SUBTRACT)
    add(enl_v_mat_extru_7_tool3.solids().sort_by_distance((-13.999999, -46.75, 70.191367))[0], mode=Mode.SUBTRACT)
    add(enl_v_mat_extru_7_tool4.solids().sort_by_distance((14, -46.75, 70.185603))[0], mode=Mode.SUBTRACT)

    # Esquisse14 → Enlèv. mat.-Extru.8 (cut)
    with BuildSketch(Plane.XZ.offset(52.25)):
        with Locations(Location((14.187545547, 9.685562878, 0), (0, 0, 270))):
            Circle(ESQUISSE14_R)
        with Locations(Location((-14.012453855, 9.691368299, 0), (0, 0, 270))):
            Circle(ESQUISSE14_R)
        with Locations(Location((-13.999998962, 70.191367017, 0), (0, 0, 270))):
            Circle(ESQUISSE14_R)
        with Locations(Location((14.000000445, 70.185602769, 0), (0, 0, 270))):
            Circle(ESQUISSE14_R)
    extrude(amount=-ENL_V_MAT_EXTRU_8_DEPTH, mode=Mode.SUBTRACT)


solid = part.part
